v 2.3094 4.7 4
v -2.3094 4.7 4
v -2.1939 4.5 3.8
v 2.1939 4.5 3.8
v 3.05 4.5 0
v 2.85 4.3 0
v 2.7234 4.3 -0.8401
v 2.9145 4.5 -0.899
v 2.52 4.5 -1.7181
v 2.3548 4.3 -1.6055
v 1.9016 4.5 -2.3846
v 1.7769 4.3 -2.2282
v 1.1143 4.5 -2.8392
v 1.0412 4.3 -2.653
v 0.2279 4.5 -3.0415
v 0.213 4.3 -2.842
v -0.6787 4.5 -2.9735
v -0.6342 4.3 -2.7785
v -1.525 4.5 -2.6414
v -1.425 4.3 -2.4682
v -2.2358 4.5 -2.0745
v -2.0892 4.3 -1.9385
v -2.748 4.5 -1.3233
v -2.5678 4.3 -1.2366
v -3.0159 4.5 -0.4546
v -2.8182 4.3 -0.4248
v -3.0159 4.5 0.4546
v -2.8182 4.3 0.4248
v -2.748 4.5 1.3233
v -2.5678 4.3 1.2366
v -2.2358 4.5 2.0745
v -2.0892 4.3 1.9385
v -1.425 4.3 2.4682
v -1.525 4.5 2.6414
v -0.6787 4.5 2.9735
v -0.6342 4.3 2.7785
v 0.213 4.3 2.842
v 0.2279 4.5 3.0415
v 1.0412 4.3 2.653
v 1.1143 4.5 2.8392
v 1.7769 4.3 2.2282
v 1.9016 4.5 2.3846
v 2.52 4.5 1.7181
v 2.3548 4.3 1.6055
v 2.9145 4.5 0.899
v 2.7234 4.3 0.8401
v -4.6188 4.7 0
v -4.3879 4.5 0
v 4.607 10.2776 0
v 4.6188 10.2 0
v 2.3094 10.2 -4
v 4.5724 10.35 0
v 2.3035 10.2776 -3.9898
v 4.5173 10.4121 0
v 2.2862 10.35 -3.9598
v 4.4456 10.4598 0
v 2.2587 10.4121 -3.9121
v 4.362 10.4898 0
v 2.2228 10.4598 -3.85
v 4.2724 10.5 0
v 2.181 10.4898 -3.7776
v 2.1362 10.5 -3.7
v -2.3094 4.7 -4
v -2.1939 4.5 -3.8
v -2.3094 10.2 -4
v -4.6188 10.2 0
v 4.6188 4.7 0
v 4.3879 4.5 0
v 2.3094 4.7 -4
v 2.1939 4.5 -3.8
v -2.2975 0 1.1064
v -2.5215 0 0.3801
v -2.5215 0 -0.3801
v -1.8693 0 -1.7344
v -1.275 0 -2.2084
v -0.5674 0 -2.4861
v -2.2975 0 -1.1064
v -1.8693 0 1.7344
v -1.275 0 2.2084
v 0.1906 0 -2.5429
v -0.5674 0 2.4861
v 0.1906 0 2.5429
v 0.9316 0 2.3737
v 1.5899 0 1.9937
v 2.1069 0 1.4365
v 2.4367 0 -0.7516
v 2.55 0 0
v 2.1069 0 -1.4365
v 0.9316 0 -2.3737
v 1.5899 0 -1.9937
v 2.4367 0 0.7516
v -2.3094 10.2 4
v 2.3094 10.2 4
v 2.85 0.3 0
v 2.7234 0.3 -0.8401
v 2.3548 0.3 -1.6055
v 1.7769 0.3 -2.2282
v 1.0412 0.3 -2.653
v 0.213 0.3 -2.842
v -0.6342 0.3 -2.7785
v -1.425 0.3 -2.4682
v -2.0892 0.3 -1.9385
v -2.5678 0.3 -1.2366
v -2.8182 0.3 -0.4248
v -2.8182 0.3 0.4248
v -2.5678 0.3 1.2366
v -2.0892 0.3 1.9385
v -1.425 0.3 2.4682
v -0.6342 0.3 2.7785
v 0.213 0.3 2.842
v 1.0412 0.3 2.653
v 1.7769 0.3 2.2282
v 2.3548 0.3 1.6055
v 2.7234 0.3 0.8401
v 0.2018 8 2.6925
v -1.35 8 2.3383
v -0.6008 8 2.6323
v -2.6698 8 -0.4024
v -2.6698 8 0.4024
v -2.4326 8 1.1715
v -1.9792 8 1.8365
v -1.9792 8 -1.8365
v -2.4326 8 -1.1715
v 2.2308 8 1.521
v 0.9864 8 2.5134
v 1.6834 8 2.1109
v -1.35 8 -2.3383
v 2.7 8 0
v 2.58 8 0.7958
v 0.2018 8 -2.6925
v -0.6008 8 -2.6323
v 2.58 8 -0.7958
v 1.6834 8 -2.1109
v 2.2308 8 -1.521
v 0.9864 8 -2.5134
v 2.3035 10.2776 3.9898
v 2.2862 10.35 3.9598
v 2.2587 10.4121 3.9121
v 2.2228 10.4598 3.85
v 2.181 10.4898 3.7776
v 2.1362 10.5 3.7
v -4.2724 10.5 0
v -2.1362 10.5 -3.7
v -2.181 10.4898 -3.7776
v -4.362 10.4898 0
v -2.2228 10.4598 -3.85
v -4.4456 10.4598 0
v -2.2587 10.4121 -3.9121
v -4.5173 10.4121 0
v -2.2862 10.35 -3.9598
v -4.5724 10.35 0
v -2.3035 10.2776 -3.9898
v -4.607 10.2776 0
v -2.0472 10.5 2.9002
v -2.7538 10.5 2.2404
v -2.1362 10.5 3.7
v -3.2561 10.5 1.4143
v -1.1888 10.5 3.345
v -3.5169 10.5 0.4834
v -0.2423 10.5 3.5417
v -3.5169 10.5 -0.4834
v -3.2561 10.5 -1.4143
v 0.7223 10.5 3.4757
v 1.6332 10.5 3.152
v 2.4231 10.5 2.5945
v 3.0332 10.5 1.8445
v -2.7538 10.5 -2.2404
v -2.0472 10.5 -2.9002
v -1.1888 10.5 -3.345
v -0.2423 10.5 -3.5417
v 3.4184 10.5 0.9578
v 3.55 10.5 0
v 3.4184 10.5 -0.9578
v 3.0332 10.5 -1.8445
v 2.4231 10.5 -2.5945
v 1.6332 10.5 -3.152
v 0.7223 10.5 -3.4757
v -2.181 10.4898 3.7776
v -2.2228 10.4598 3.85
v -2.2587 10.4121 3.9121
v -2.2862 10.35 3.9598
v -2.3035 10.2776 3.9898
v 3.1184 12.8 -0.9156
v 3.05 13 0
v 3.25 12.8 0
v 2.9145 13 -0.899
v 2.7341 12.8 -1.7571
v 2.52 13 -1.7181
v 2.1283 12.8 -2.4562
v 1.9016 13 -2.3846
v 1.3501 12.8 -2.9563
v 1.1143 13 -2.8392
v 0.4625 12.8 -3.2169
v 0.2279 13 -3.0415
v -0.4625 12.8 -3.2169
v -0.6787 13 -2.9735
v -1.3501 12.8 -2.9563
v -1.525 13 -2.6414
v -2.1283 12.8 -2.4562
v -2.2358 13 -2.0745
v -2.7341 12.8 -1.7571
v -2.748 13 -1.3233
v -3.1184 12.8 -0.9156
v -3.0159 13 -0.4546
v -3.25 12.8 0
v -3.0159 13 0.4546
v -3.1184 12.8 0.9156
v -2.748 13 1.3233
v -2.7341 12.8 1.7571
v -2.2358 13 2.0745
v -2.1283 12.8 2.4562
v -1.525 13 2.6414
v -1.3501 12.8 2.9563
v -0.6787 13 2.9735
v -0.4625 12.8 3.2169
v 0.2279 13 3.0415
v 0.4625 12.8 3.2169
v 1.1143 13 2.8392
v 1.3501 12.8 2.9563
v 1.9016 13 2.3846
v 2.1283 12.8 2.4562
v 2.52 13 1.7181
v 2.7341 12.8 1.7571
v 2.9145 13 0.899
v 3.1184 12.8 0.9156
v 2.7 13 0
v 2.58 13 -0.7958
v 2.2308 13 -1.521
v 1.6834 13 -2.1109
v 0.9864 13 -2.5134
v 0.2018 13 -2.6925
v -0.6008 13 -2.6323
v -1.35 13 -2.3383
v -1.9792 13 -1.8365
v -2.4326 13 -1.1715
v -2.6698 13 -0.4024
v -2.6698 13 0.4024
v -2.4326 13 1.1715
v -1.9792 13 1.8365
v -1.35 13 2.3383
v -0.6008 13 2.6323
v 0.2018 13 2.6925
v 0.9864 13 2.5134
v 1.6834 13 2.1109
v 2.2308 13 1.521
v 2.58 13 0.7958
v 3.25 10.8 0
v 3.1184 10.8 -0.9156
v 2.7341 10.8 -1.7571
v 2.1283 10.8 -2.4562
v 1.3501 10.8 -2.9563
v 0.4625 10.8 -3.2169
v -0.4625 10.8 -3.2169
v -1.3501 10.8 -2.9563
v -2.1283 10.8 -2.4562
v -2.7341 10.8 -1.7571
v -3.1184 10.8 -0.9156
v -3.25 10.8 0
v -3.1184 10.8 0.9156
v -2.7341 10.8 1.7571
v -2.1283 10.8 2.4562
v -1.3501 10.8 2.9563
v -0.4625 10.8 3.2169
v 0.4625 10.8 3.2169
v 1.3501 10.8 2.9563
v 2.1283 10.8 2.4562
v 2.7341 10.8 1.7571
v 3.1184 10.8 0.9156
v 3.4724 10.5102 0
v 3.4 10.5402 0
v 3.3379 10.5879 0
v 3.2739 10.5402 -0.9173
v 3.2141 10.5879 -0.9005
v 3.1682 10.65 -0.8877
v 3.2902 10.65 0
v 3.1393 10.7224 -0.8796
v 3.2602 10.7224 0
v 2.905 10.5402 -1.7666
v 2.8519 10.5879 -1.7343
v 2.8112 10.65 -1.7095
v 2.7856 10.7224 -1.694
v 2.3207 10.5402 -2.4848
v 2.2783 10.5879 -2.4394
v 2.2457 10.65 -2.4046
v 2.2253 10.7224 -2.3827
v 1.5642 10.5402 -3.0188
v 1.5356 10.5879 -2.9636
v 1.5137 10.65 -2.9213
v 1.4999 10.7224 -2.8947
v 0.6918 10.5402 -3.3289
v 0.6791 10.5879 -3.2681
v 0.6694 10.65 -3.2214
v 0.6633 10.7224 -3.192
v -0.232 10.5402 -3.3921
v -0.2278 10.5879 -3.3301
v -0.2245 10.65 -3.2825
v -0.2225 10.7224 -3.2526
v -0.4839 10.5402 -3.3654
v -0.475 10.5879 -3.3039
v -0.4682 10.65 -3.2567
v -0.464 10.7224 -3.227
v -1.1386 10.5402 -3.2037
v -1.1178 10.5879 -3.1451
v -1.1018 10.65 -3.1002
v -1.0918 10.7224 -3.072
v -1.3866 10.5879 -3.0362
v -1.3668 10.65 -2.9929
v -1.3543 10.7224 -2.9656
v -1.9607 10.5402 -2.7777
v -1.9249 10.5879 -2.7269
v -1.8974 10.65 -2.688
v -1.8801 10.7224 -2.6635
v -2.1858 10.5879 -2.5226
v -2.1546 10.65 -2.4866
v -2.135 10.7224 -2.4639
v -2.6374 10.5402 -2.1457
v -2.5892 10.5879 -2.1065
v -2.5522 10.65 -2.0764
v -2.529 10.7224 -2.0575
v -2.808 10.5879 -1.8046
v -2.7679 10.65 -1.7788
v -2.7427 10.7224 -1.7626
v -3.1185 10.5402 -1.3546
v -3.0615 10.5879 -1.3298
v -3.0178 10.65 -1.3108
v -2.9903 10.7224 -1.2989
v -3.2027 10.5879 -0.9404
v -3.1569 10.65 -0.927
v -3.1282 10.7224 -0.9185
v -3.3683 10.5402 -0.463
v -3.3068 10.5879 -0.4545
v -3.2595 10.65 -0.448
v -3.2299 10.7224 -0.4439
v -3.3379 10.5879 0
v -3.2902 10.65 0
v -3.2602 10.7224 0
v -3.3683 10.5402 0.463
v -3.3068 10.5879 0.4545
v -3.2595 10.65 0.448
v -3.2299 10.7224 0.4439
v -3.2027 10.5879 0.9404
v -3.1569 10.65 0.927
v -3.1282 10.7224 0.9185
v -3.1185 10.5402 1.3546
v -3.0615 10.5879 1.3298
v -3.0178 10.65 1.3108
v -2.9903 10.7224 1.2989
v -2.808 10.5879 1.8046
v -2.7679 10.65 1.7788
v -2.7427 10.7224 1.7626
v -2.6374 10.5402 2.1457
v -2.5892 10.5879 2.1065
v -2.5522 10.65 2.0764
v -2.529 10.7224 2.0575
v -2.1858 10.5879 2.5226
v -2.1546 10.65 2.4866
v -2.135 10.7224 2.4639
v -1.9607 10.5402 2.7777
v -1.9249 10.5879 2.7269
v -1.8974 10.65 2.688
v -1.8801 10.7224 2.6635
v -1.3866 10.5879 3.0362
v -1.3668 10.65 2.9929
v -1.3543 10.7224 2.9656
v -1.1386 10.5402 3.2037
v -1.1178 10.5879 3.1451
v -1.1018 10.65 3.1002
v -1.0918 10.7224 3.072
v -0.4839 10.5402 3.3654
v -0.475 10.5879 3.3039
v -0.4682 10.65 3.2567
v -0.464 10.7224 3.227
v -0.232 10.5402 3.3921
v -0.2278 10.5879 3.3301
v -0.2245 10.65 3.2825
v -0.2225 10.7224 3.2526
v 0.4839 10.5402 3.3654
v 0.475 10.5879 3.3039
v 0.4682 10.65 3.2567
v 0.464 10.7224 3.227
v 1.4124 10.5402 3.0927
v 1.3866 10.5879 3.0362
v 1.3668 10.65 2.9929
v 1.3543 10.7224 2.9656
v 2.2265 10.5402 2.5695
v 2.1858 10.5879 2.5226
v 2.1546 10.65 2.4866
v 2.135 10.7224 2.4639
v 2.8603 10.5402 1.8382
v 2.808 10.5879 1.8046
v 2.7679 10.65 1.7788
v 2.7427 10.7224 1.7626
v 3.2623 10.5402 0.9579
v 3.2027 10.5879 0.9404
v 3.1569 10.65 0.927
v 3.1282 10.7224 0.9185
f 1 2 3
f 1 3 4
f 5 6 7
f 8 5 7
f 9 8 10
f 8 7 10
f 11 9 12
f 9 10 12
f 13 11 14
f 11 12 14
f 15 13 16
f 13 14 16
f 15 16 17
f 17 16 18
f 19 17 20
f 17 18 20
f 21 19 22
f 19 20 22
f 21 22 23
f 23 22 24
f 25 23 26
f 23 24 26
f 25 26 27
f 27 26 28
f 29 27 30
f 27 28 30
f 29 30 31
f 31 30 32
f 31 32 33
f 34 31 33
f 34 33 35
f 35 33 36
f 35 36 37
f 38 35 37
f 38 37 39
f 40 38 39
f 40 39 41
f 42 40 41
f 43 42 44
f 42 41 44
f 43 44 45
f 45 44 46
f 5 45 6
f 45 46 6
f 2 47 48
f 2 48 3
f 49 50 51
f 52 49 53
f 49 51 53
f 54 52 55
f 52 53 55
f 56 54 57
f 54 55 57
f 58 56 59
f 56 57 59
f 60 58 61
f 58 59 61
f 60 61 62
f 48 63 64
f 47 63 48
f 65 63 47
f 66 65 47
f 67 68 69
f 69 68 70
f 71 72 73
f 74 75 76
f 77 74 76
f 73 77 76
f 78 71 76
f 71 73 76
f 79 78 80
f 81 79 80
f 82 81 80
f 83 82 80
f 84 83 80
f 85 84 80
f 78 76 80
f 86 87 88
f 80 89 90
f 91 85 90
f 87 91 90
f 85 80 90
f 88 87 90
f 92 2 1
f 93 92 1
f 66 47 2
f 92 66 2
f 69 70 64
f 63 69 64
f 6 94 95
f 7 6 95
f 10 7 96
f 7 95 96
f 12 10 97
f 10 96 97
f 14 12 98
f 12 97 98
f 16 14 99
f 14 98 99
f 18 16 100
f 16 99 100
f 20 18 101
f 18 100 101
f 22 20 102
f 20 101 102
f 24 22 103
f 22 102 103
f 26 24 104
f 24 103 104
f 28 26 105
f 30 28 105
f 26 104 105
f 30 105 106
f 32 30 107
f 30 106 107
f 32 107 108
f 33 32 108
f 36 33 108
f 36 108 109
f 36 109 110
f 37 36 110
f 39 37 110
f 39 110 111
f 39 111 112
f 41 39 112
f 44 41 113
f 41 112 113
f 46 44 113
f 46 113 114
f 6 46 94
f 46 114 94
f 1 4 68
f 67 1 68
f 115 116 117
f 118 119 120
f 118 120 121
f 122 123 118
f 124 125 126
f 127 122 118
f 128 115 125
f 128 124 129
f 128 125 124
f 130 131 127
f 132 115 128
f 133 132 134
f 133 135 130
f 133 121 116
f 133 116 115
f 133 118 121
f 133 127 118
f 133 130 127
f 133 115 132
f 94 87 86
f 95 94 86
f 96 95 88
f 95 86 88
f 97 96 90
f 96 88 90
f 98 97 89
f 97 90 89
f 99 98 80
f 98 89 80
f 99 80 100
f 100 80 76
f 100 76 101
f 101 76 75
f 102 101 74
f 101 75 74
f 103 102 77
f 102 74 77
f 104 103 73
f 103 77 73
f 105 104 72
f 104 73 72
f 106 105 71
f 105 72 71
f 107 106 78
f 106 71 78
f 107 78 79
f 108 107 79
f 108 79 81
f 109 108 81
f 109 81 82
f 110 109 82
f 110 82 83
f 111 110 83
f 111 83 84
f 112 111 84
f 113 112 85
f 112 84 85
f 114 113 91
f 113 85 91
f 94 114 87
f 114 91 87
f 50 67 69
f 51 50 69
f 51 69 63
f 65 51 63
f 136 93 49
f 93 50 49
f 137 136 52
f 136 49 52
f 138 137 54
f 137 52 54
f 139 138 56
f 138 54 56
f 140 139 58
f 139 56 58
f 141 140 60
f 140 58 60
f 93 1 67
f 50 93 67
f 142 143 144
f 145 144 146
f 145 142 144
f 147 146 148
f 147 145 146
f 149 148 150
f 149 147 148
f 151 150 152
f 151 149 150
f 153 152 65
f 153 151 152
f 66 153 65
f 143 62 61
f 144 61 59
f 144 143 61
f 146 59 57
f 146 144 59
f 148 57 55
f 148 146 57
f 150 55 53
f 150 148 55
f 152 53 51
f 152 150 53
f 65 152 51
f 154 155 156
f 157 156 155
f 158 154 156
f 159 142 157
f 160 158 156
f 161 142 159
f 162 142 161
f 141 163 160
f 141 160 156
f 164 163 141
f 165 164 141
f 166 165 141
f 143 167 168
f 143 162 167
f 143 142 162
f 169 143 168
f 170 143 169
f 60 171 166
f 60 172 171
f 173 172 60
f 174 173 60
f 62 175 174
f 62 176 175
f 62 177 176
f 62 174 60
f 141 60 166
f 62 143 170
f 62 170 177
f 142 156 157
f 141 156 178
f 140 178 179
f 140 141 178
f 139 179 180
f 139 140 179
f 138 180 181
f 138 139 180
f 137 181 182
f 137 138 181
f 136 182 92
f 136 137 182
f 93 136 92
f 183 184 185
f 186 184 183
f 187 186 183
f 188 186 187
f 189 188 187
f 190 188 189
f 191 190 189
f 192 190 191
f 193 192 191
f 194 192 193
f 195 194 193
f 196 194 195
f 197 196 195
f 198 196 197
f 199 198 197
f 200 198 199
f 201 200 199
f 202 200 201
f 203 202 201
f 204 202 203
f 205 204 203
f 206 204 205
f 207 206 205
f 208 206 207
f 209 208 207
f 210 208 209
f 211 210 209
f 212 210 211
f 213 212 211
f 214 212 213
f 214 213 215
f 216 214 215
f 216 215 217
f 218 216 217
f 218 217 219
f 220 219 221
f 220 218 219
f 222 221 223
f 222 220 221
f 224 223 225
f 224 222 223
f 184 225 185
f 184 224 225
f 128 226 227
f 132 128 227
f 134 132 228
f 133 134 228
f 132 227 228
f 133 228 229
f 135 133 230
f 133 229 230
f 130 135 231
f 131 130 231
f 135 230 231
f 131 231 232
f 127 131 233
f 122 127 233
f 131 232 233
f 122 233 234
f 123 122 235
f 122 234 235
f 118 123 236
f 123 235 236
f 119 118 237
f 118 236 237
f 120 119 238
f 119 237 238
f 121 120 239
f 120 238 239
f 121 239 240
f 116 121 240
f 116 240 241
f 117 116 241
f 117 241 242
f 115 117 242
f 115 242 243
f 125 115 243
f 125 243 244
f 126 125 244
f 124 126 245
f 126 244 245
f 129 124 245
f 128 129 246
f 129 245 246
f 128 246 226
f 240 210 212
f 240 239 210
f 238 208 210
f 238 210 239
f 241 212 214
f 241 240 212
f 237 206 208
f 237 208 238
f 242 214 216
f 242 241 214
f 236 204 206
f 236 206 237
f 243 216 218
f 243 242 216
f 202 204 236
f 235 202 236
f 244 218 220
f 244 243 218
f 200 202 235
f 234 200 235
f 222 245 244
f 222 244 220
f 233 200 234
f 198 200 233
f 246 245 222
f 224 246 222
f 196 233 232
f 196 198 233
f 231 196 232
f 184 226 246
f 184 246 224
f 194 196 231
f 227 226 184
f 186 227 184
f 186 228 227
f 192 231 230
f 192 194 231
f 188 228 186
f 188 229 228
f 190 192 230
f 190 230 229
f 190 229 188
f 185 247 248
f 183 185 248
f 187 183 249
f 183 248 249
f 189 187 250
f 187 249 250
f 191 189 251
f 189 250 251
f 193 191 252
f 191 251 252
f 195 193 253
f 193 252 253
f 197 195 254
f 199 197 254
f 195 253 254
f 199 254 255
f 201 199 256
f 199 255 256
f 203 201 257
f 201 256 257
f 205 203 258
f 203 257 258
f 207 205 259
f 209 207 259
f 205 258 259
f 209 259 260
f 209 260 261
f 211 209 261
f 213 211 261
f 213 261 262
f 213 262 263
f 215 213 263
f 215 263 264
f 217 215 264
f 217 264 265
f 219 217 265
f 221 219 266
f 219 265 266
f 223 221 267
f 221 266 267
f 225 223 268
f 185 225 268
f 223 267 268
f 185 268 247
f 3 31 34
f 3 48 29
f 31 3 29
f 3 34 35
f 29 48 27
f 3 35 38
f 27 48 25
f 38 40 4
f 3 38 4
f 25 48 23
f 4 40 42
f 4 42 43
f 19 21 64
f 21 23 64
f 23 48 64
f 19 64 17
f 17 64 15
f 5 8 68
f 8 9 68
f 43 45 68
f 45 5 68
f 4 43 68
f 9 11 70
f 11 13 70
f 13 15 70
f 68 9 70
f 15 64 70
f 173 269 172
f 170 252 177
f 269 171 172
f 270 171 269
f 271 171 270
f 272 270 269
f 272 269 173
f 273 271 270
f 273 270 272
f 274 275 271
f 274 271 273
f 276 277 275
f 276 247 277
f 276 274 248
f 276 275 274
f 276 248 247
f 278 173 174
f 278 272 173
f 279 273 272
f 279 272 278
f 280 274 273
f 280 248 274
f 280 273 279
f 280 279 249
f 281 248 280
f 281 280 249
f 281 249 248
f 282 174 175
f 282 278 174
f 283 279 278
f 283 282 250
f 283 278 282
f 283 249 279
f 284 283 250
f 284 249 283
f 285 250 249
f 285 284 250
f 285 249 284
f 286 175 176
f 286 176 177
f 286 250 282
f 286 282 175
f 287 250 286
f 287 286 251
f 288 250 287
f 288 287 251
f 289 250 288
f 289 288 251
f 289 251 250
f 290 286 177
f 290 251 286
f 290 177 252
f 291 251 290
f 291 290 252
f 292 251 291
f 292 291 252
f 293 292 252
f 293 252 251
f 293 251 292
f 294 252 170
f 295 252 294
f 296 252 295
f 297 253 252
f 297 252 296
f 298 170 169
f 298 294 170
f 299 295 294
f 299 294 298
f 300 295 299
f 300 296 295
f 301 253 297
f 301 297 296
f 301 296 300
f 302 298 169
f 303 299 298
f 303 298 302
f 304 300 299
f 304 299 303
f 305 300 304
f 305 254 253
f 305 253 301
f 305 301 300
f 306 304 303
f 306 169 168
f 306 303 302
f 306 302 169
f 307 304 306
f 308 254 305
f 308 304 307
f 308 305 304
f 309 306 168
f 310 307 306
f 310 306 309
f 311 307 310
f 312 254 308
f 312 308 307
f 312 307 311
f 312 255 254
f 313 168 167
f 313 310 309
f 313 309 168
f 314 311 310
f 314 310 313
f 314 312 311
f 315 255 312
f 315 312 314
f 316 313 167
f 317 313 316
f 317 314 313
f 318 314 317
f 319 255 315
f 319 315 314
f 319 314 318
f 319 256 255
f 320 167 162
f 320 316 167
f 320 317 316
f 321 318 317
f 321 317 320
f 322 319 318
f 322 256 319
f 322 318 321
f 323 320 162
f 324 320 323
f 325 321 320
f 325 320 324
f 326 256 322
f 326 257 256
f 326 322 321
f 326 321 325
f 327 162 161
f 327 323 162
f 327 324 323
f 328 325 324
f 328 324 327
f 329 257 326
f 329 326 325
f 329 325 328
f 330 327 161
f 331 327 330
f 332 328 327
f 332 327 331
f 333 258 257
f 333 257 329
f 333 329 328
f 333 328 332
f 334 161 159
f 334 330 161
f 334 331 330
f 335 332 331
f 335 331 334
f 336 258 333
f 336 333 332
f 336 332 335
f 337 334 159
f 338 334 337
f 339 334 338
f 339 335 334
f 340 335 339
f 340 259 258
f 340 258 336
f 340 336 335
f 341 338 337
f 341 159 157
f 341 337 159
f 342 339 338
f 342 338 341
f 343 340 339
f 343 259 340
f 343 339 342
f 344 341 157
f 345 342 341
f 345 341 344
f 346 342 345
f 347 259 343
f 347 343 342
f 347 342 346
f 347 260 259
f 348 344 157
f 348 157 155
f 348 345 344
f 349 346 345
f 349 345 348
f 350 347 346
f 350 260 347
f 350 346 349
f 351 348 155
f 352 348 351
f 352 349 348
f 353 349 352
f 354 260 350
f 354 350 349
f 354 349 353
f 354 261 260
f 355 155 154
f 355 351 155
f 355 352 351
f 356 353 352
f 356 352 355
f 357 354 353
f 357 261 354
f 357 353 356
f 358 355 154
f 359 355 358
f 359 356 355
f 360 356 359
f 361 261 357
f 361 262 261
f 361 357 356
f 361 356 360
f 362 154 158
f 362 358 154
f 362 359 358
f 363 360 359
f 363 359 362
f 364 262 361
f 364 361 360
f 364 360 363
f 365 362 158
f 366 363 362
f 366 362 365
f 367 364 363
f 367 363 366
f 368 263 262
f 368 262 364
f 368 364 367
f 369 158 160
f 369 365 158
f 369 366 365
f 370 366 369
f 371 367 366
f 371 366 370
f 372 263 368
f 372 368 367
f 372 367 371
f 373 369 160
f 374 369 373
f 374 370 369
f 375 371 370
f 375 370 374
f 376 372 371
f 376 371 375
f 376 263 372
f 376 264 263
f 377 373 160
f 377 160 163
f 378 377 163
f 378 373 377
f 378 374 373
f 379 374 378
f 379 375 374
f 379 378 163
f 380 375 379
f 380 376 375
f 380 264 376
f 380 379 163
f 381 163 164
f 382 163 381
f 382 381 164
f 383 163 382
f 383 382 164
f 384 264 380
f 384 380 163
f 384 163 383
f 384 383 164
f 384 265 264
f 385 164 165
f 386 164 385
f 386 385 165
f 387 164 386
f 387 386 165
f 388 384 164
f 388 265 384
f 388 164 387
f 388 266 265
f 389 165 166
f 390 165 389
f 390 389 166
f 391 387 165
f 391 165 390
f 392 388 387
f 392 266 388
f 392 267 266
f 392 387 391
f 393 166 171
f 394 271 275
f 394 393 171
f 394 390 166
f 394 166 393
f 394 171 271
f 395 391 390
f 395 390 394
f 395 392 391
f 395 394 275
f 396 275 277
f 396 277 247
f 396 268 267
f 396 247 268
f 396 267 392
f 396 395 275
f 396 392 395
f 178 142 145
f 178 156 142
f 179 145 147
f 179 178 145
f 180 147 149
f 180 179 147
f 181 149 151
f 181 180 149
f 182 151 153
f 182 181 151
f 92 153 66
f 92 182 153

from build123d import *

# Parameters (mm, degrees)
SKETCH_1_R          = 2.85
EXTRUDE_1_DEPTH     = 4.5
EXTRUDE_2_DEPTH     = 6
SKETCH_3_R          = 3.25
EXTRUDE_3_DEPTH     = 2.5
CHAMFER_3_SIZE      = 0.2
FILLET_2_R          = 0.3
CHAMFER_4_SIZE      = 0.2
CHAMFER_5_SIZE      = 0.3
SKETCH_5_R          = 2.7
CUT_EXTRUDE_1_DEPTH = 5


with BuildPart() as part:
    # 草图1 → 凸台-拉伸1 (new body)
    with BuildSketch(Plane(origin=(0, 0, 0), x_dir=(1, 0, 0), z_dir=(0, 1, 0))):
        Circle(SKETCH_1_R)
    extrude(amount=EXTRUDE_1_DEPTH)

    # 草图2 → 凸台-拉伸2 (add)
    with BuildSketch(Plane(origin=(0, 4.5, 0), x_dir=(1, 0, 0), z_dir=(0, 1, 0))):
        Polygon((4.618802154, 0), (2.309401077, 4), (-2.309401077, 4), (-4.618802154, 0), (-2.309401077, -4), (2.309401077, -4), align=None)
    extrude(amount=EXTRUDE_2_DEPTH)

    # 草图3 → 凸台-拉伸3 (add)
    with BuildSketch(Plane(origin=(0, 10.5, 0), x_dir=(1, 0, 0), z_dir=(0, 1, 0))):
        Circle(SKETCH_3_R)
    extrude(amount=EXTRUDE_3_DEPTH)

    # 倒角3
    chamfer_3_edges = [part.edges().sort_by_distance(p)[0] for p in [
        (-2.85, 4.5, 0),
        (3.464101615, 4.5, 2),
        (3.464101615, 4.5, -2),
        (0, 4.5, -4),
        (-3.464101615, 4.5, -2),
        (-3.464101615, 4.5, 2),
        (0, 4.5, 4),
    ]]
    chamfer(chamfer_3_edges, length=CHAMFER_3_SIZE)

    # 圆角2
    fillet_2_edges = [part.edges().sort_by_distance(p)[0] for p in [
        (-3.25, 10.5, 0),
        (3.464101615, 10.5, 2),
        (3.464101615, 10.5, -2),
        (0, 10.5, -4),
        (-3.464101615, 10.5, -2),
        (-3.464101615, 10.5, 2),
        (0, 10.5, 4),
    ]]
    fillet(fillet_2_edges, radius=FILLET_2_R)

    # 倒角4
    chamfer_4_edges = [part.edges().sort_by_distance(p)[0] for p in [
        (-3.25, 13, 0),
    ]]
    chamfer(chamfer_4_edges, length=CHAMFER_4_SIZE)

    # 倒角5
    chamfer_5_edges = [part.edges().sort_by_distance(p)[0] for p in [
        (-2.85, 0, 0),
    ]]
    chamfer(chamfer_5_edges, length=CHAMFER_5_SIZE)

    # 草图5 → 切除-拉伸1 (cut)
    with BuildSketch(Plane(origin=(0, 13, 0), x_dir=(1, 0, 0), z_dir=(0, 1, 0))):
        Circle(SKETCH_5_R)
    extrude(amount=-CUT_EXTRUDE_1_DEPTH, mode=Mode.SUBTRACT)


solid = part.part
